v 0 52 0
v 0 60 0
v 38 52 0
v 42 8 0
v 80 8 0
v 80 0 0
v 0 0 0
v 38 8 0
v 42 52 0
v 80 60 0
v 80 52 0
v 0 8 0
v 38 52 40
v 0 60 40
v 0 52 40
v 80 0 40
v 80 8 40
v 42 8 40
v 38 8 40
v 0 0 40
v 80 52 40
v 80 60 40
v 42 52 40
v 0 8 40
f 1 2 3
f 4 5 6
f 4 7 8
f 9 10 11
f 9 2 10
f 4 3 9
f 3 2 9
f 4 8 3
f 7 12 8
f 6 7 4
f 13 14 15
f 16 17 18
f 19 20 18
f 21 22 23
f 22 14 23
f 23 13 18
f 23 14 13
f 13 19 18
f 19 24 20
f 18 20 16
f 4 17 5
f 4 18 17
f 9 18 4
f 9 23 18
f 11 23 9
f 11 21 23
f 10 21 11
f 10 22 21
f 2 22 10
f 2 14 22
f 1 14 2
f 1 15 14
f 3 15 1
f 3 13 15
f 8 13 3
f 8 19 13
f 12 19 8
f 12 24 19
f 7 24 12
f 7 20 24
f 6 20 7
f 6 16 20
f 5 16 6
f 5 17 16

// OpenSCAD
$fn = 32;

// ----------------------------------------------------------------------
// Structural section: ibeam 80 x 60 mm
// ----------------------------------------------------------------------

// --- parameters (mm) ---
sec_w = 80;               // section width, X
sec_h = 60;               // section height, Y
flange_t = 8;             // flange thickness
web_t = 4;                // web thickness
plate_t = 40;             // cut length, Z (extrusion height)

profile = [[0, 0], [80, 0], [80, 8], [42, 8], [42, 52], [80, 52], [80, 60], [0, 60], [0, 52], [38, 52], [38, 8], [0, 8]];  // primary outline, 12 points, counter clockwise

// --- the one profile operation ---
linear_extrude(height = plate_t) polygon(points = profile);
